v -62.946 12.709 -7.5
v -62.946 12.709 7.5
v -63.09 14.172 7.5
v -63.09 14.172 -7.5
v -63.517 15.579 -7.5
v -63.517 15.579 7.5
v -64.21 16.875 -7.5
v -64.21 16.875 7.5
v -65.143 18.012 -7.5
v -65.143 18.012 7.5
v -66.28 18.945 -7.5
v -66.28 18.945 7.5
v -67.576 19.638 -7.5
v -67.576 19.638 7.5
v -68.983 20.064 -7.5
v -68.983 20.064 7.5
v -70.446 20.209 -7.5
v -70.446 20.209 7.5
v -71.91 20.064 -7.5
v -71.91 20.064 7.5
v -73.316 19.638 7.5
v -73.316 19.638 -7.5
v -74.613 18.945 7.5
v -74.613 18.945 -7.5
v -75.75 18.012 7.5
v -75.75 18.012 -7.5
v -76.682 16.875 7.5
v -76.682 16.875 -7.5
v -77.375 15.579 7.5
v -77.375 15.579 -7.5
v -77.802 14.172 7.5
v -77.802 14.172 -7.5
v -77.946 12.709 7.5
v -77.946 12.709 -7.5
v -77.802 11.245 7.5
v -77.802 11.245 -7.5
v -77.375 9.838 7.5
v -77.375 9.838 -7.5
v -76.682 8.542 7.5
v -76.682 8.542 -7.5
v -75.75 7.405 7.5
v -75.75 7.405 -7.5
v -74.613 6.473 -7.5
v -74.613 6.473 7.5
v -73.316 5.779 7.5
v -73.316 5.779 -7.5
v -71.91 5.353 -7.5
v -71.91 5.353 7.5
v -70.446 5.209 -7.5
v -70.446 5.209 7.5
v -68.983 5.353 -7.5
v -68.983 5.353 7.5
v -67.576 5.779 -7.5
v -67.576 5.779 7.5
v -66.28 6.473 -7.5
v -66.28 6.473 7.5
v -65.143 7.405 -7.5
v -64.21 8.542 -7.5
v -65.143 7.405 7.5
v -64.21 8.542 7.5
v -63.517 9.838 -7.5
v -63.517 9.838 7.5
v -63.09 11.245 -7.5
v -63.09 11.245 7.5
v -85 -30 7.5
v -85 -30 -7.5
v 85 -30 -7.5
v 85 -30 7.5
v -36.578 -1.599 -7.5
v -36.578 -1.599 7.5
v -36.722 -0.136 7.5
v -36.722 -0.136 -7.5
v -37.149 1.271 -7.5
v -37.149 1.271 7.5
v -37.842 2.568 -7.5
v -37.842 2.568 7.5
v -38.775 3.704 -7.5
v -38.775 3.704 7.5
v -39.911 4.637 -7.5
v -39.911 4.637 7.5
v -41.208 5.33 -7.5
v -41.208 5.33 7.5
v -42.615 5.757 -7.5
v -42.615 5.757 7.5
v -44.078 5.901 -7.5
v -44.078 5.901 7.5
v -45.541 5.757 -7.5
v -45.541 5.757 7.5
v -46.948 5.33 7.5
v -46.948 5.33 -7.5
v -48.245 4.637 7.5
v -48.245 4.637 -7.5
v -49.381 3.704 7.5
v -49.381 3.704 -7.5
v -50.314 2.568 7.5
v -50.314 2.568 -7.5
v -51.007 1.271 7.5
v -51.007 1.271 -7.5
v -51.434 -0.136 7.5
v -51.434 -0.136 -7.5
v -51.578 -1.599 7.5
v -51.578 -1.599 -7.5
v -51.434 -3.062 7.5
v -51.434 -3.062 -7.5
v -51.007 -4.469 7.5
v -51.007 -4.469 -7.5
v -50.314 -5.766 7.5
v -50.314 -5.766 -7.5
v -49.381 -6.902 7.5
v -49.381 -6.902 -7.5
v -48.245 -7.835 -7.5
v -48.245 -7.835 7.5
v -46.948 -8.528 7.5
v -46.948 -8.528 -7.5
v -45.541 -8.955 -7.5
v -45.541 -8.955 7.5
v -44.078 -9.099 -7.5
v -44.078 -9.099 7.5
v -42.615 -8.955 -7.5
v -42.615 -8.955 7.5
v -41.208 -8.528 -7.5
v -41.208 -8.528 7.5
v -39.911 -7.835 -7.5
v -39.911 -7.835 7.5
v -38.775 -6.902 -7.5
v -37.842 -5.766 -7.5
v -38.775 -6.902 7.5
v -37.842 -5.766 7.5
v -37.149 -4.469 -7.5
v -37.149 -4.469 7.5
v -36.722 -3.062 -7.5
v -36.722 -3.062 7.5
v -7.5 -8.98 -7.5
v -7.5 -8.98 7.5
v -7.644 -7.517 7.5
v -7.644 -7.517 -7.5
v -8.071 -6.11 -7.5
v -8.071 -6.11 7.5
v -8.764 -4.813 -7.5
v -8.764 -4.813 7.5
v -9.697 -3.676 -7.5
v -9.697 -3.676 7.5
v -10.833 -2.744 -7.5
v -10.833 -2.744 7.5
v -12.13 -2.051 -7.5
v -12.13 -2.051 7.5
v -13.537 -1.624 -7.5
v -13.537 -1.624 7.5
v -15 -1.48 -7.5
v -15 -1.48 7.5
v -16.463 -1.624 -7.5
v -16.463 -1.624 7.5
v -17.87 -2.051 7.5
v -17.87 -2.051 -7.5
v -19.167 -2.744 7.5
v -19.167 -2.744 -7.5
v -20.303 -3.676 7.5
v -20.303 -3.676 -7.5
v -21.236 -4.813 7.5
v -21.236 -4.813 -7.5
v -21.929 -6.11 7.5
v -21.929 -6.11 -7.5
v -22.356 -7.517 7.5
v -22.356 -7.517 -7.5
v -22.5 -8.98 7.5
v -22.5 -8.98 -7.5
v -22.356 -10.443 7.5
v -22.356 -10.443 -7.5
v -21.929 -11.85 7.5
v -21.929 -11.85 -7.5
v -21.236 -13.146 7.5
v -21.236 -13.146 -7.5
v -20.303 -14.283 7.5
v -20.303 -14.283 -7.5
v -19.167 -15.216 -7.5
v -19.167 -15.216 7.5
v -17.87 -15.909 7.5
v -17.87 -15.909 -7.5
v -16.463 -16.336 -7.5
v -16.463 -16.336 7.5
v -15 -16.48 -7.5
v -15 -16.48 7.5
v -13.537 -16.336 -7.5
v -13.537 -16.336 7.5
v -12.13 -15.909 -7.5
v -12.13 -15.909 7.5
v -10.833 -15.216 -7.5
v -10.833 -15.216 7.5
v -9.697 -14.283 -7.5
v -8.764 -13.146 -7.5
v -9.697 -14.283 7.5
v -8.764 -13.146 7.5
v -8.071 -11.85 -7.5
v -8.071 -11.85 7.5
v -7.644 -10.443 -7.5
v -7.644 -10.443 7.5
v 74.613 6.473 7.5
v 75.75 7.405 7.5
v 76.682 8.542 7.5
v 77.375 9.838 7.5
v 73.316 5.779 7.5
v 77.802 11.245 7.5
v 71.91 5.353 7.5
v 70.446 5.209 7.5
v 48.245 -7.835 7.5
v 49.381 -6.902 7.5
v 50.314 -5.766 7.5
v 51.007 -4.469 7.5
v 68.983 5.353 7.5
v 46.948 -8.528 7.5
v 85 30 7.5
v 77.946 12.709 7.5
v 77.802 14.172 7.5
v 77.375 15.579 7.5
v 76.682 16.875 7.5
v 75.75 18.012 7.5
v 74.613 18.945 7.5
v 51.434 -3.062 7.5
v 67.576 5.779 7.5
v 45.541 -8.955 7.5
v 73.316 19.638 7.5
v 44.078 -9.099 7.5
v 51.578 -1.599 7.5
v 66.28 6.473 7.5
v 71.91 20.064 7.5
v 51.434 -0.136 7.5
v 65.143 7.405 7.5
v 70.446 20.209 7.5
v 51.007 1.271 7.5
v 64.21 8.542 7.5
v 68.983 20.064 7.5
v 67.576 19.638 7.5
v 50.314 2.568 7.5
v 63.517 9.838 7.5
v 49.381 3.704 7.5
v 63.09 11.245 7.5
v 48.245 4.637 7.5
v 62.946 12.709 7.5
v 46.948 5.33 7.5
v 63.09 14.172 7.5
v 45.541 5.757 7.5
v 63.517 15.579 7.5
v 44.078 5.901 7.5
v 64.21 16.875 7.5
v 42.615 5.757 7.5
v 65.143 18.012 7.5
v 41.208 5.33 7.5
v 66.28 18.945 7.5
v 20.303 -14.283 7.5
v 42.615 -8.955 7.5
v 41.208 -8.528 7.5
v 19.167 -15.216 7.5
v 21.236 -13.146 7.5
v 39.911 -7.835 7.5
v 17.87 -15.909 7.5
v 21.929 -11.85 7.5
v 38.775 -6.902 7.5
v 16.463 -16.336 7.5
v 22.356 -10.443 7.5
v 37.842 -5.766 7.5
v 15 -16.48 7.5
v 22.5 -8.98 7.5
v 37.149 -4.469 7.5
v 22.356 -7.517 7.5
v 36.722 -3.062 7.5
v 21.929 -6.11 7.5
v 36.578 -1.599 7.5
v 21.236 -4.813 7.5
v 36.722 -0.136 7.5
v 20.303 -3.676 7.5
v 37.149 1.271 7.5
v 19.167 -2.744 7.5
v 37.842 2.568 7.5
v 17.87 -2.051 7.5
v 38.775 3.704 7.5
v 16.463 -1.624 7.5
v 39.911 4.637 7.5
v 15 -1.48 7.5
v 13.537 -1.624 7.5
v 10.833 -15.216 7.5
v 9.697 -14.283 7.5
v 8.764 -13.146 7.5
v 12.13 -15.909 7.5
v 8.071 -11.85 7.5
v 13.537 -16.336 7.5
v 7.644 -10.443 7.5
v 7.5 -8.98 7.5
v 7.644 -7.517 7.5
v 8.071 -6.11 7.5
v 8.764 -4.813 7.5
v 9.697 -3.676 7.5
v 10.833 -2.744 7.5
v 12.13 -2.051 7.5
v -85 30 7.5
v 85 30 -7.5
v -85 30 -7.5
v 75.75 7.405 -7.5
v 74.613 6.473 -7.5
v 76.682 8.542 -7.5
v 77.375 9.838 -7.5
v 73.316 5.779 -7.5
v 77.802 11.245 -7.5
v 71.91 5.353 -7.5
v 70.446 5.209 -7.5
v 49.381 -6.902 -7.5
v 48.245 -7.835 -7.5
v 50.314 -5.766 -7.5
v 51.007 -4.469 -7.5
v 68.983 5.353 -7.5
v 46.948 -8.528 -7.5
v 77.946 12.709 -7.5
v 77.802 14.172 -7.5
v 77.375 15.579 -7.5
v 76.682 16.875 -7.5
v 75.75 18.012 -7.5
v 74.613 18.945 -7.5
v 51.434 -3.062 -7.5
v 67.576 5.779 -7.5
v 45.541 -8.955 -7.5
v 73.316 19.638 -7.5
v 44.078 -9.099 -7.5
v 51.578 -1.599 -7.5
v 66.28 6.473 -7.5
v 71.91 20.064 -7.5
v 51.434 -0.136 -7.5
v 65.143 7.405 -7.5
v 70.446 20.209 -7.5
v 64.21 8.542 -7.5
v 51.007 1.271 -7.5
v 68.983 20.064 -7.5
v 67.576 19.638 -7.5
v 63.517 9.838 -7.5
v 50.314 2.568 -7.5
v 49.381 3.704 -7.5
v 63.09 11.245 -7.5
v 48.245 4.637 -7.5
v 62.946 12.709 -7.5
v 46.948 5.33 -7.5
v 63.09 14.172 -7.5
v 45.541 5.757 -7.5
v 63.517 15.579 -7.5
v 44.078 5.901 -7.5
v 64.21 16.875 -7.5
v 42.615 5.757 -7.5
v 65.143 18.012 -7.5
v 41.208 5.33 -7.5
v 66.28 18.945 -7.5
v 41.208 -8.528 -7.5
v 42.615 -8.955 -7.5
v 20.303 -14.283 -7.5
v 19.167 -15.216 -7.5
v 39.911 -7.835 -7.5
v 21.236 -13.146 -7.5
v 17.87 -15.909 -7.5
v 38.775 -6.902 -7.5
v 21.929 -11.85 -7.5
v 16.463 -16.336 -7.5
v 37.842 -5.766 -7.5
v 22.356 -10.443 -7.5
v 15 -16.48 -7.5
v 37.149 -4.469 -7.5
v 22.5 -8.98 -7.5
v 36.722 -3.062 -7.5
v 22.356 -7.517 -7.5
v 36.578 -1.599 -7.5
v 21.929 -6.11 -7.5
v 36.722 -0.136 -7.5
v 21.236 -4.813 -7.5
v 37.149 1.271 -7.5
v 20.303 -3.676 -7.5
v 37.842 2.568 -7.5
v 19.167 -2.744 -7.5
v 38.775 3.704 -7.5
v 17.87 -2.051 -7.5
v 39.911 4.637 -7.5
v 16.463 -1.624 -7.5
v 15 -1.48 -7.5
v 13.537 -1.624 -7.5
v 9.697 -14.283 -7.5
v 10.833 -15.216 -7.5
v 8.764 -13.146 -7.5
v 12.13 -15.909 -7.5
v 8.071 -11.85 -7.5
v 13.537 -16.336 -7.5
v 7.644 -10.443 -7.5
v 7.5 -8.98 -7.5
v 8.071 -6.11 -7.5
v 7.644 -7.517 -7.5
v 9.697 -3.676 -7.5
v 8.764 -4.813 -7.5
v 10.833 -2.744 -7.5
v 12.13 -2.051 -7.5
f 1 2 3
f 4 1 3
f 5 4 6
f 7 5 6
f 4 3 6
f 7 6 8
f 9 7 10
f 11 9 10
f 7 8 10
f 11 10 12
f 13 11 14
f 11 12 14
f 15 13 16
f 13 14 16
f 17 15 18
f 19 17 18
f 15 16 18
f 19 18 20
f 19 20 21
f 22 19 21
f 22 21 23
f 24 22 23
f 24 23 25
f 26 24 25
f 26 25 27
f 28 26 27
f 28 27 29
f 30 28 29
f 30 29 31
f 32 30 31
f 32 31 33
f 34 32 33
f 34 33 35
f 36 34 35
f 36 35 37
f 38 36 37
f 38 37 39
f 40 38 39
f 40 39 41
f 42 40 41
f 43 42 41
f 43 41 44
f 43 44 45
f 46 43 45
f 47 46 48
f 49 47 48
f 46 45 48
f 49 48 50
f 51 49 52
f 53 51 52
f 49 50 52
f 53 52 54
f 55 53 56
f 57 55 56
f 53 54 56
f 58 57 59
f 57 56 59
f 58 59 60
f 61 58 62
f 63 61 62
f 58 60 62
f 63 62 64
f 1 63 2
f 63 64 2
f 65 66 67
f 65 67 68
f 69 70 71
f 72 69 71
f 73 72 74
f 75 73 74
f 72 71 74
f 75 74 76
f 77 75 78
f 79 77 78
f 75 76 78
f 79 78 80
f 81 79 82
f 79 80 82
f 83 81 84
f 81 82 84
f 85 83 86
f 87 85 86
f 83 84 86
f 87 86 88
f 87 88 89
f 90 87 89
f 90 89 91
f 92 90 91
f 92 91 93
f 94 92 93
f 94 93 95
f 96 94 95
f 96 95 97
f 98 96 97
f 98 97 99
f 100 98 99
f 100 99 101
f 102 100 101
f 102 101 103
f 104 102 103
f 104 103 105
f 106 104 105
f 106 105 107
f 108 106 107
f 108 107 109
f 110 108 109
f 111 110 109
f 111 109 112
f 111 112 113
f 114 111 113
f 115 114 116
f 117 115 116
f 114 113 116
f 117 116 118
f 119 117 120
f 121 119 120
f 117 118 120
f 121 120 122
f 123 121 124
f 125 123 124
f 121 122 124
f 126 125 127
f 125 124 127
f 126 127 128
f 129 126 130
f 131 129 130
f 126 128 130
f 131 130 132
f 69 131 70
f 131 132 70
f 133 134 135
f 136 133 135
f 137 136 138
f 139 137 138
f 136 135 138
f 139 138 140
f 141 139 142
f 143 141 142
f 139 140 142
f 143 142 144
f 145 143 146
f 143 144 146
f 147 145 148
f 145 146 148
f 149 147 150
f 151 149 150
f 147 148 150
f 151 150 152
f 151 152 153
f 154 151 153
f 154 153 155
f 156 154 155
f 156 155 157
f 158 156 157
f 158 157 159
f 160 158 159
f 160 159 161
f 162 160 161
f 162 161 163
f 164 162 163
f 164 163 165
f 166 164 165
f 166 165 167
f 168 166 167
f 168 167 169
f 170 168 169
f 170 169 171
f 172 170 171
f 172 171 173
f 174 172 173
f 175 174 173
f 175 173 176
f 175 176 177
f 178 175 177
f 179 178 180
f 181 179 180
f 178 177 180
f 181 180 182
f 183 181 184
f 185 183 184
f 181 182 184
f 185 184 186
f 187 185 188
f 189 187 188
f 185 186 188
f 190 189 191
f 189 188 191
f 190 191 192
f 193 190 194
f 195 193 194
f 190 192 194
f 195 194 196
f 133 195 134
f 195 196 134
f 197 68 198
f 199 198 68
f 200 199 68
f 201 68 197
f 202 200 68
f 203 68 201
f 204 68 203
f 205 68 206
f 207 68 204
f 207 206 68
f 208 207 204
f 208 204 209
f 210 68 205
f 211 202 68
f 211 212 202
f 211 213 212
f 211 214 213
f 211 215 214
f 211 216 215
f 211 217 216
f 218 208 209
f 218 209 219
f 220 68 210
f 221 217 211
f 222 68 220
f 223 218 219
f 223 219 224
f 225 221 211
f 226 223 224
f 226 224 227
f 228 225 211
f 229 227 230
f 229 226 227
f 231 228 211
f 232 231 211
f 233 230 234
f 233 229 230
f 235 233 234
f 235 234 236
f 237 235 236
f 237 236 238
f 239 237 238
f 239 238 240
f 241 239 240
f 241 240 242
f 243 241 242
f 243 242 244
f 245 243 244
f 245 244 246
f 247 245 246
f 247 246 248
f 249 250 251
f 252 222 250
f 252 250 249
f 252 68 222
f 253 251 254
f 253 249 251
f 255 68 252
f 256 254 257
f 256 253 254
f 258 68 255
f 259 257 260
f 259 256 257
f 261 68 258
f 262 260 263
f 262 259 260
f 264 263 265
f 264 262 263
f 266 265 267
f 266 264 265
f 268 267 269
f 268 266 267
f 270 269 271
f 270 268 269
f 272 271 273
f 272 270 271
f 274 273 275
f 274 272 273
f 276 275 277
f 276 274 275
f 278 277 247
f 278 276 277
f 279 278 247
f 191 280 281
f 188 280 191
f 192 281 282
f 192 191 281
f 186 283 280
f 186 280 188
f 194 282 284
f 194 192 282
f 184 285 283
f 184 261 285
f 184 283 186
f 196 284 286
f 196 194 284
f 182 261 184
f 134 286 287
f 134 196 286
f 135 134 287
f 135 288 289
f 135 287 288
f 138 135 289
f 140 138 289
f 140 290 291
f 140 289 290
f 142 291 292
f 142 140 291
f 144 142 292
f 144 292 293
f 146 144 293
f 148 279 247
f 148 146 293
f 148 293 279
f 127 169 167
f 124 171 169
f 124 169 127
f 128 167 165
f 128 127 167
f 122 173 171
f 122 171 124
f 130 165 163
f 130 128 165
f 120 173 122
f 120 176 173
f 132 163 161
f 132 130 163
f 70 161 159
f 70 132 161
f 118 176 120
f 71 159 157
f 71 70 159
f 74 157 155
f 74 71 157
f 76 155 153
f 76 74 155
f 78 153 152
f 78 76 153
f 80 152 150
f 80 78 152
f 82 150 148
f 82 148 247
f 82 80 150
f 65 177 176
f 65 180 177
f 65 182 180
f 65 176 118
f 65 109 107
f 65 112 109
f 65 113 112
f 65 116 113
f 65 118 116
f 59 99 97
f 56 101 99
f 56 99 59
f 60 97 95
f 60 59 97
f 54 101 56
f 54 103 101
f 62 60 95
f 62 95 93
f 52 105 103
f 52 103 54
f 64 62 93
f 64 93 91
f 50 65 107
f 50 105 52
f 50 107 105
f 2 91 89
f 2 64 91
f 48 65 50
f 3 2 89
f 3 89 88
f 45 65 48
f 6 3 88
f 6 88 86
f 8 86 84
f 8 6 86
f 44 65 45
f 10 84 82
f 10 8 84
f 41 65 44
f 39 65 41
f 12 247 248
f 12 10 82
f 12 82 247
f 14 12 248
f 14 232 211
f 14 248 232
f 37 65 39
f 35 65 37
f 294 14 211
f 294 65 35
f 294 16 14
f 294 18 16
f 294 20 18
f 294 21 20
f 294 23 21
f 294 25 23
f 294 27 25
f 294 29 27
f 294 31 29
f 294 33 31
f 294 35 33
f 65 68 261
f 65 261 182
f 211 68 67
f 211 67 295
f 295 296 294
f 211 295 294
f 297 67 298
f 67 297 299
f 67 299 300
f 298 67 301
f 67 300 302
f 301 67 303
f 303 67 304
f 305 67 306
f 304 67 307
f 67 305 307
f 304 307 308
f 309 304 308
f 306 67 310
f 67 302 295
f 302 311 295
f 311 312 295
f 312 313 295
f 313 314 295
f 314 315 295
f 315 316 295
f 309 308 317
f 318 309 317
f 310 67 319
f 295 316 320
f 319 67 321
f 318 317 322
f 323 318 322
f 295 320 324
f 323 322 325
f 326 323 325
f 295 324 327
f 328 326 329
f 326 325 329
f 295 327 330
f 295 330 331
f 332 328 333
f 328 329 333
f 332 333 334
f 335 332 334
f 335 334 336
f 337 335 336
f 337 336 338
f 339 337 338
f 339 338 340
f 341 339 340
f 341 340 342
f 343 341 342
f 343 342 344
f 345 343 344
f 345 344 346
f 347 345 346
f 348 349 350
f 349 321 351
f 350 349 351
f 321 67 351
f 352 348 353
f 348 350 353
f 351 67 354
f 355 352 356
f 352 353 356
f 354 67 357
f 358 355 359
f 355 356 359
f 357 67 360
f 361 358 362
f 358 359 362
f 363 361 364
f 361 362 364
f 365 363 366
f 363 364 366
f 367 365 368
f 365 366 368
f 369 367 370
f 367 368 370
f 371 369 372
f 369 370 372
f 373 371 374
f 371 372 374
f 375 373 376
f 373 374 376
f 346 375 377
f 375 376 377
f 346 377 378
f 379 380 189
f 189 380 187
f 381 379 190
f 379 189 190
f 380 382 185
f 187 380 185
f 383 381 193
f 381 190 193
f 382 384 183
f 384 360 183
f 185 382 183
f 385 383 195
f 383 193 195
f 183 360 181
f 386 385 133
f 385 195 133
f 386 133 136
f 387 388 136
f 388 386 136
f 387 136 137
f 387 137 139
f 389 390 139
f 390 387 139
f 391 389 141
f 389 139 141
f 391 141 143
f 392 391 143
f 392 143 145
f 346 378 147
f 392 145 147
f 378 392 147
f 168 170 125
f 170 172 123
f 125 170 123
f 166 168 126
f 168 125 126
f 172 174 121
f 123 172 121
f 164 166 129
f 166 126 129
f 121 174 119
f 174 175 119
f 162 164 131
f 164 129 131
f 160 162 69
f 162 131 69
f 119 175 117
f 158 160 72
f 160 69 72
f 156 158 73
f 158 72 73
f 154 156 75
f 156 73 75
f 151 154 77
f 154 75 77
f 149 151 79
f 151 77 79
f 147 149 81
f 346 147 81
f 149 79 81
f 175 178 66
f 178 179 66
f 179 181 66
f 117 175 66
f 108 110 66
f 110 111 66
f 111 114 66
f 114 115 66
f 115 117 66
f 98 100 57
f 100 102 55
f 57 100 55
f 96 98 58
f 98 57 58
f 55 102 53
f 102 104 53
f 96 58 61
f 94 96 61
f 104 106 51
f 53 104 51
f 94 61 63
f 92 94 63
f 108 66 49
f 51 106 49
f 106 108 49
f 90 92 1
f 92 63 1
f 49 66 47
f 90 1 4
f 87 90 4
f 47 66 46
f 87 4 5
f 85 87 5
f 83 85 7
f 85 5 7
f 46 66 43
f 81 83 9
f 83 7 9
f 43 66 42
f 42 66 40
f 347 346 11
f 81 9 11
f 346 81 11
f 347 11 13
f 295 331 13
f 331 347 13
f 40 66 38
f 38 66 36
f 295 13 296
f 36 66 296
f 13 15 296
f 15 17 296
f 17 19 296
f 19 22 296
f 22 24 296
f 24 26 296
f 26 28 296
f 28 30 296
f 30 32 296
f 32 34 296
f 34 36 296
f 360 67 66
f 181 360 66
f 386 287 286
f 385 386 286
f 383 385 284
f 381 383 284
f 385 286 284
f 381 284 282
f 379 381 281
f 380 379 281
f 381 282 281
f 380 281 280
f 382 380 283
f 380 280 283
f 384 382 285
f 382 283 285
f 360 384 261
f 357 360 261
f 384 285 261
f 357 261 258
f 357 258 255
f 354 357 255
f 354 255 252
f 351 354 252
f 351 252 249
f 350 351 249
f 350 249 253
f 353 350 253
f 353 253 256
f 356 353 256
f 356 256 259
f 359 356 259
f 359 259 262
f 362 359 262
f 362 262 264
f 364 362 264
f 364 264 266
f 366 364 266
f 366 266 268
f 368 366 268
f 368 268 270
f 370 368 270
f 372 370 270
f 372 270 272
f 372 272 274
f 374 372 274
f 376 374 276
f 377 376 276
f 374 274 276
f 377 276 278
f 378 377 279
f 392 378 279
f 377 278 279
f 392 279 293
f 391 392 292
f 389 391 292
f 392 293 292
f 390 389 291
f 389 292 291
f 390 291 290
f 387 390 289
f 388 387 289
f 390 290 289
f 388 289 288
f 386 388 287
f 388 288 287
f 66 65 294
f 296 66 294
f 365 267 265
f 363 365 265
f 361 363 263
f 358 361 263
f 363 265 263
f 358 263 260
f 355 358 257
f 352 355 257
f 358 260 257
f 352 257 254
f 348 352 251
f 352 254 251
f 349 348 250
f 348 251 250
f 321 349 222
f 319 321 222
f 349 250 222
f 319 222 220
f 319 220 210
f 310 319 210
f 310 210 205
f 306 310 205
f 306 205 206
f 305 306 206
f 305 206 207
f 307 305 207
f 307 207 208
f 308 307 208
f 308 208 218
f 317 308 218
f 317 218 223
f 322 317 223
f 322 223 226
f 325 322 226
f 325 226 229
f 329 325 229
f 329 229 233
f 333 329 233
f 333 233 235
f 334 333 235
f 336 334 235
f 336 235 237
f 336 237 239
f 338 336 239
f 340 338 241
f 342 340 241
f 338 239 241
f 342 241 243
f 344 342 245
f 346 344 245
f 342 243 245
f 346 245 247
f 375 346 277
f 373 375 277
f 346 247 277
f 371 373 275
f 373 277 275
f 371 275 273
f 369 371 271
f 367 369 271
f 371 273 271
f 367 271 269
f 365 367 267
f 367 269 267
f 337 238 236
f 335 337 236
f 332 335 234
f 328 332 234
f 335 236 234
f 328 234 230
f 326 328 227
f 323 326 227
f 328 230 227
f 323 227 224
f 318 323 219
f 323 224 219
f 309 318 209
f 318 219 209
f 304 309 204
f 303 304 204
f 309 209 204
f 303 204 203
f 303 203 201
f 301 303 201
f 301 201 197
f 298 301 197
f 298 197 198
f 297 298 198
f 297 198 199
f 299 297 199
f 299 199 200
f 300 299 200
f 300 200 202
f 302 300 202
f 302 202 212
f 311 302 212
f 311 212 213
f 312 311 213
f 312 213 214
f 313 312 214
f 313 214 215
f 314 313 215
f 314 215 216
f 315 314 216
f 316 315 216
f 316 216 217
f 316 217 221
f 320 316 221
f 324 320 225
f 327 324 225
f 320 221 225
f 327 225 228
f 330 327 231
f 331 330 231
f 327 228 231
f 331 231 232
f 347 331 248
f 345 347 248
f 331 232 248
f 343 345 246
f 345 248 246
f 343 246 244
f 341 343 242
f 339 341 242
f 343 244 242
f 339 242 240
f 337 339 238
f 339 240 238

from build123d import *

# Parameters (mm, degrees)
PLAT_W                      = 60
PLAT_H                      = 15
EL_MENT_M_CANO_SOUD_1_DEPTH = 170
ESQUISSE2_R                 = 7.5
ENL_V_MAT_EXTRU_1_DEPTH     = 16


with BuildPart() as part:
    # plat → Elément mécano-soudé1 (new body)
    with BuildSketch(Plane.YZ.offset(-85)):
        Rectangle(PLAT_W, PLAT_H)
    extrude(amount=EL_MENT_M_CANO_SOUD_1_DEPTH)

    # Esquisse2 → Enlèv. mat.-Extru.1 (cut, through all)
    with BuildSketch(Plane.XY.offset(7.5)):
        with Locations((-15, -8.979692736)):
            Circle(ESQUISSE2_R)
        with Locations((-44.077931835, -1.599050475)):
            Circle(ESQUISSE2_R)
        with Locations((-70.446339823, 12.708537029)):
            Circle(ESQUISSE2_R)
        with Locations(Location((70.446339823, 12.708537029, 0), (0, 0, 180))):  # turned: the seam where the file's is
            Circle(ESQUISSE2_R)
        with Locations(Location((44.077931835, -1.599050475, 0), (0, 0, 180))):  # turned: the seam where the file's is
            Circle(ESQUISSE2_R)
        with Locations(Location((15, -8.979692736, 0), (0, 0, 180))):  # turned: the seam where the file's is
            Circle(ESQUISSE2_R)
    extrude(amount=-ENL_V_MAT_EXTRU_1_DEPTH, mode=Mode.SUBTRACT)


solid = part.part
